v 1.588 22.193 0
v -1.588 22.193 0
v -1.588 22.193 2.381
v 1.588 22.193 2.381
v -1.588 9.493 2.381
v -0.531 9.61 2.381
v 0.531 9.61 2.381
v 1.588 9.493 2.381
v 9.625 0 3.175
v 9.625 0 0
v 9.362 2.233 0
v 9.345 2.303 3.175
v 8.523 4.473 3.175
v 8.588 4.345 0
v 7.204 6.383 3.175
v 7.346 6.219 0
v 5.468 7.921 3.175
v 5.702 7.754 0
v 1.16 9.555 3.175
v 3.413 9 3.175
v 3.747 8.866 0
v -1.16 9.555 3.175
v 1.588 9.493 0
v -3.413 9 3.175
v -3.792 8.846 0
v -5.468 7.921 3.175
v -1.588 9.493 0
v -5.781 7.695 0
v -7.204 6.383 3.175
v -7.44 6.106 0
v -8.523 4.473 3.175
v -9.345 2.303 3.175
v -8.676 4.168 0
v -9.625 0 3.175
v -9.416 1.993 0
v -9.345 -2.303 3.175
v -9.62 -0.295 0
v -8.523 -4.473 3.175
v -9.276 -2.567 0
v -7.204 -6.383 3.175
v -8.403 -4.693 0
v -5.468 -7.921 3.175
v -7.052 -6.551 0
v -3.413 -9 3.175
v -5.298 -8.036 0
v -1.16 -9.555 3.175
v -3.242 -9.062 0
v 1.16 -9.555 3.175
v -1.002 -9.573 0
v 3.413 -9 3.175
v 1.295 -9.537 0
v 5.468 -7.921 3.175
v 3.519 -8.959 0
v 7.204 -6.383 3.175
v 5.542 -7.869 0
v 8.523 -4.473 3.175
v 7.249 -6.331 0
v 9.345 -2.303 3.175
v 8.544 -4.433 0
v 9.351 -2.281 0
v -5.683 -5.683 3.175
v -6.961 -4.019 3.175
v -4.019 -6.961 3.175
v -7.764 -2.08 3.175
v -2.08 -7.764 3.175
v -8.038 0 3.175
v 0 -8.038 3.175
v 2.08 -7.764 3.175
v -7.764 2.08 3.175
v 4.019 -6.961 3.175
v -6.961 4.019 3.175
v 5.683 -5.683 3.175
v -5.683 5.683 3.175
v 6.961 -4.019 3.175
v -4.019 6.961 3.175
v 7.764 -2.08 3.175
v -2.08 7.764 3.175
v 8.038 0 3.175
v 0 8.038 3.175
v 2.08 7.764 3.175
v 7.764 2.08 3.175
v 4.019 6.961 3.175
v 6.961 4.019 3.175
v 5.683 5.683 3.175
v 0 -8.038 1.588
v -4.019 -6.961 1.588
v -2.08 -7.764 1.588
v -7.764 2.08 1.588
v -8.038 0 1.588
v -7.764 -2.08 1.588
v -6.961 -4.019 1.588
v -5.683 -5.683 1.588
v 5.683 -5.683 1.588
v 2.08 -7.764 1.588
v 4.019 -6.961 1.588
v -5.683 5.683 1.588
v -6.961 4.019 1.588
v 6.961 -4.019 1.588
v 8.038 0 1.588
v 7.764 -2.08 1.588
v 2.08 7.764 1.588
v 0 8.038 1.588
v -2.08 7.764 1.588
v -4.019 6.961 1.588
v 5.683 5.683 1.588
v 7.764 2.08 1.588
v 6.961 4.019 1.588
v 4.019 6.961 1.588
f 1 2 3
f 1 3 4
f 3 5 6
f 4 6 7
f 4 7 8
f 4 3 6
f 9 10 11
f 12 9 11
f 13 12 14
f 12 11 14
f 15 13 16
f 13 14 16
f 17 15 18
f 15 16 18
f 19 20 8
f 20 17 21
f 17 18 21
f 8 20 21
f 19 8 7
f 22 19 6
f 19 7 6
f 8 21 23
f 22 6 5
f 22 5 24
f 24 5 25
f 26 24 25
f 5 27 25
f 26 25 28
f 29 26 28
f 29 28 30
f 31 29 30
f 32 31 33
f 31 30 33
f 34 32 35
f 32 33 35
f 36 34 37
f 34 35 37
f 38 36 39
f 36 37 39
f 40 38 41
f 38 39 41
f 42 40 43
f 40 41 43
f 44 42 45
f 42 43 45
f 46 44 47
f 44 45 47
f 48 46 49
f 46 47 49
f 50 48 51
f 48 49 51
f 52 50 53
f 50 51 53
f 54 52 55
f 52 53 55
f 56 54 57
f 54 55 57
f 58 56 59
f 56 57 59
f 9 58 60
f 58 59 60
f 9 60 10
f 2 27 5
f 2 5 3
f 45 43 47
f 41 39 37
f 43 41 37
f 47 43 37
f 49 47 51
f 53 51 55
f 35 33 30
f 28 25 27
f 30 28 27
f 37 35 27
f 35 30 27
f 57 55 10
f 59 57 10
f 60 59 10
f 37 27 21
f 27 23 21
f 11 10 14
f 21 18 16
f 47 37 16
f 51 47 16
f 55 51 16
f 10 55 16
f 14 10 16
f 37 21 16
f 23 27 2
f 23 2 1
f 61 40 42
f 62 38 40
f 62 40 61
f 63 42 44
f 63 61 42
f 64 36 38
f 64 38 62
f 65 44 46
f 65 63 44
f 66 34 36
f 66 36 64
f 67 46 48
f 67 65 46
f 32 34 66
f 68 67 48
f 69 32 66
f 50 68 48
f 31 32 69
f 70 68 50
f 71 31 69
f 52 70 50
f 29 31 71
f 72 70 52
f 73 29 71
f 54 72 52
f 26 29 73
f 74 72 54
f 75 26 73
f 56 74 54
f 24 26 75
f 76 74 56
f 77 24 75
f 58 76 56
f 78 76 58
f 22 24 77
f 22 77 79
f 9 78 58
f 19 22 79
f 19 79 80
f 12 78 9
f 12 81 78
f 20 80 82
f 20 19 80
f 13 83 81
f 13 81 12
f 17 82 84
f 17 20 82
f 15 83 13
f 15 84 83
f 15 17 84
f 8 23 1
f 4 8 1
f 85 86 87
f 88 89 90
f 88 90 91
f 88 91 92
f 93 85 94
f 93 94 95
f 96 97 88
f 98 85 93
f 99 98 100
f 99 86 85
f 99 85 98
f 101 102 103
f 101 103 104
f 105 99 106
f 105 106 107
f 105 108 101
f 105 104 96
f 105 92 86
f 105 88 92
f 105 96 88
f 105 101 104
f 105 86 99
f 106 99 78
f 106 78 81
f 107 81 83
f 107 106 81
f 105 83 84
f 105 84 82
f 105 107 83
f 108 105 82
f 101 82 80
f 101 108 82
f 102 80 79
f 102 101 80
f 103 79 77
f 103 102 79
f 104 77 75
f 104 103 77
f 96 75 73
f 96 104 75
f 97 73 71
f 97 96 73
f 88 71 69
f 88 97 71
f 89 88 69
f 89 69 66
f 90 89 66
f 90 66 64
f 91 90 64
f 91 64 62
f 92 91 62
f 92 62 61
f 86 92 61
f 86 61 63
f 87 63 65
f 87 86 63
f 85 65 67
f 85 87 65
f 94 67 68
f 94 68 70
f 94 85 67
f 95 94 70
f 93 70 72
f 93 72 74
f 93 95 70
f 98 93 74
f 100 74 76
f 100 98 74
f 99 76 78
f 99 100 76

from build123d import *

# Parameters (mm, degrees)
F0_R     = 9.625
F1_DEPTH = 1.5875
F2_R     = 9.625
F2_R_2   = 8.0375
F3_DEPTH = 1.5875
F4_W     = 3.175
F4_H     = 12.7
F5_DEPTH = 2.38125


with BuildPart() as f1:
    # F0 (on Top) → F1 (new body)
    with BuildSketch(Plane.XY):
        Circle(F0_R)
    extrude(amount=F1_DEPTH)

    # F2 (on face) → F3 (join)
    with BuildSketch(Plane.XY.offset(1.5875)):
        Circle(F2_R)
        Circle(F2_R_2, mode=Mode.SUBTRACT)
    extrude(amount=F3_DEPTH)

    # F4 (on Top) → F5 (join)
    with BuildSketch(Plane.XY):
        with Locations((0, 15.8431801179)):
            Rectangle(F4_W, F4_H)
    extrude(amount=F5_DEPTH)


solid = f1.part
